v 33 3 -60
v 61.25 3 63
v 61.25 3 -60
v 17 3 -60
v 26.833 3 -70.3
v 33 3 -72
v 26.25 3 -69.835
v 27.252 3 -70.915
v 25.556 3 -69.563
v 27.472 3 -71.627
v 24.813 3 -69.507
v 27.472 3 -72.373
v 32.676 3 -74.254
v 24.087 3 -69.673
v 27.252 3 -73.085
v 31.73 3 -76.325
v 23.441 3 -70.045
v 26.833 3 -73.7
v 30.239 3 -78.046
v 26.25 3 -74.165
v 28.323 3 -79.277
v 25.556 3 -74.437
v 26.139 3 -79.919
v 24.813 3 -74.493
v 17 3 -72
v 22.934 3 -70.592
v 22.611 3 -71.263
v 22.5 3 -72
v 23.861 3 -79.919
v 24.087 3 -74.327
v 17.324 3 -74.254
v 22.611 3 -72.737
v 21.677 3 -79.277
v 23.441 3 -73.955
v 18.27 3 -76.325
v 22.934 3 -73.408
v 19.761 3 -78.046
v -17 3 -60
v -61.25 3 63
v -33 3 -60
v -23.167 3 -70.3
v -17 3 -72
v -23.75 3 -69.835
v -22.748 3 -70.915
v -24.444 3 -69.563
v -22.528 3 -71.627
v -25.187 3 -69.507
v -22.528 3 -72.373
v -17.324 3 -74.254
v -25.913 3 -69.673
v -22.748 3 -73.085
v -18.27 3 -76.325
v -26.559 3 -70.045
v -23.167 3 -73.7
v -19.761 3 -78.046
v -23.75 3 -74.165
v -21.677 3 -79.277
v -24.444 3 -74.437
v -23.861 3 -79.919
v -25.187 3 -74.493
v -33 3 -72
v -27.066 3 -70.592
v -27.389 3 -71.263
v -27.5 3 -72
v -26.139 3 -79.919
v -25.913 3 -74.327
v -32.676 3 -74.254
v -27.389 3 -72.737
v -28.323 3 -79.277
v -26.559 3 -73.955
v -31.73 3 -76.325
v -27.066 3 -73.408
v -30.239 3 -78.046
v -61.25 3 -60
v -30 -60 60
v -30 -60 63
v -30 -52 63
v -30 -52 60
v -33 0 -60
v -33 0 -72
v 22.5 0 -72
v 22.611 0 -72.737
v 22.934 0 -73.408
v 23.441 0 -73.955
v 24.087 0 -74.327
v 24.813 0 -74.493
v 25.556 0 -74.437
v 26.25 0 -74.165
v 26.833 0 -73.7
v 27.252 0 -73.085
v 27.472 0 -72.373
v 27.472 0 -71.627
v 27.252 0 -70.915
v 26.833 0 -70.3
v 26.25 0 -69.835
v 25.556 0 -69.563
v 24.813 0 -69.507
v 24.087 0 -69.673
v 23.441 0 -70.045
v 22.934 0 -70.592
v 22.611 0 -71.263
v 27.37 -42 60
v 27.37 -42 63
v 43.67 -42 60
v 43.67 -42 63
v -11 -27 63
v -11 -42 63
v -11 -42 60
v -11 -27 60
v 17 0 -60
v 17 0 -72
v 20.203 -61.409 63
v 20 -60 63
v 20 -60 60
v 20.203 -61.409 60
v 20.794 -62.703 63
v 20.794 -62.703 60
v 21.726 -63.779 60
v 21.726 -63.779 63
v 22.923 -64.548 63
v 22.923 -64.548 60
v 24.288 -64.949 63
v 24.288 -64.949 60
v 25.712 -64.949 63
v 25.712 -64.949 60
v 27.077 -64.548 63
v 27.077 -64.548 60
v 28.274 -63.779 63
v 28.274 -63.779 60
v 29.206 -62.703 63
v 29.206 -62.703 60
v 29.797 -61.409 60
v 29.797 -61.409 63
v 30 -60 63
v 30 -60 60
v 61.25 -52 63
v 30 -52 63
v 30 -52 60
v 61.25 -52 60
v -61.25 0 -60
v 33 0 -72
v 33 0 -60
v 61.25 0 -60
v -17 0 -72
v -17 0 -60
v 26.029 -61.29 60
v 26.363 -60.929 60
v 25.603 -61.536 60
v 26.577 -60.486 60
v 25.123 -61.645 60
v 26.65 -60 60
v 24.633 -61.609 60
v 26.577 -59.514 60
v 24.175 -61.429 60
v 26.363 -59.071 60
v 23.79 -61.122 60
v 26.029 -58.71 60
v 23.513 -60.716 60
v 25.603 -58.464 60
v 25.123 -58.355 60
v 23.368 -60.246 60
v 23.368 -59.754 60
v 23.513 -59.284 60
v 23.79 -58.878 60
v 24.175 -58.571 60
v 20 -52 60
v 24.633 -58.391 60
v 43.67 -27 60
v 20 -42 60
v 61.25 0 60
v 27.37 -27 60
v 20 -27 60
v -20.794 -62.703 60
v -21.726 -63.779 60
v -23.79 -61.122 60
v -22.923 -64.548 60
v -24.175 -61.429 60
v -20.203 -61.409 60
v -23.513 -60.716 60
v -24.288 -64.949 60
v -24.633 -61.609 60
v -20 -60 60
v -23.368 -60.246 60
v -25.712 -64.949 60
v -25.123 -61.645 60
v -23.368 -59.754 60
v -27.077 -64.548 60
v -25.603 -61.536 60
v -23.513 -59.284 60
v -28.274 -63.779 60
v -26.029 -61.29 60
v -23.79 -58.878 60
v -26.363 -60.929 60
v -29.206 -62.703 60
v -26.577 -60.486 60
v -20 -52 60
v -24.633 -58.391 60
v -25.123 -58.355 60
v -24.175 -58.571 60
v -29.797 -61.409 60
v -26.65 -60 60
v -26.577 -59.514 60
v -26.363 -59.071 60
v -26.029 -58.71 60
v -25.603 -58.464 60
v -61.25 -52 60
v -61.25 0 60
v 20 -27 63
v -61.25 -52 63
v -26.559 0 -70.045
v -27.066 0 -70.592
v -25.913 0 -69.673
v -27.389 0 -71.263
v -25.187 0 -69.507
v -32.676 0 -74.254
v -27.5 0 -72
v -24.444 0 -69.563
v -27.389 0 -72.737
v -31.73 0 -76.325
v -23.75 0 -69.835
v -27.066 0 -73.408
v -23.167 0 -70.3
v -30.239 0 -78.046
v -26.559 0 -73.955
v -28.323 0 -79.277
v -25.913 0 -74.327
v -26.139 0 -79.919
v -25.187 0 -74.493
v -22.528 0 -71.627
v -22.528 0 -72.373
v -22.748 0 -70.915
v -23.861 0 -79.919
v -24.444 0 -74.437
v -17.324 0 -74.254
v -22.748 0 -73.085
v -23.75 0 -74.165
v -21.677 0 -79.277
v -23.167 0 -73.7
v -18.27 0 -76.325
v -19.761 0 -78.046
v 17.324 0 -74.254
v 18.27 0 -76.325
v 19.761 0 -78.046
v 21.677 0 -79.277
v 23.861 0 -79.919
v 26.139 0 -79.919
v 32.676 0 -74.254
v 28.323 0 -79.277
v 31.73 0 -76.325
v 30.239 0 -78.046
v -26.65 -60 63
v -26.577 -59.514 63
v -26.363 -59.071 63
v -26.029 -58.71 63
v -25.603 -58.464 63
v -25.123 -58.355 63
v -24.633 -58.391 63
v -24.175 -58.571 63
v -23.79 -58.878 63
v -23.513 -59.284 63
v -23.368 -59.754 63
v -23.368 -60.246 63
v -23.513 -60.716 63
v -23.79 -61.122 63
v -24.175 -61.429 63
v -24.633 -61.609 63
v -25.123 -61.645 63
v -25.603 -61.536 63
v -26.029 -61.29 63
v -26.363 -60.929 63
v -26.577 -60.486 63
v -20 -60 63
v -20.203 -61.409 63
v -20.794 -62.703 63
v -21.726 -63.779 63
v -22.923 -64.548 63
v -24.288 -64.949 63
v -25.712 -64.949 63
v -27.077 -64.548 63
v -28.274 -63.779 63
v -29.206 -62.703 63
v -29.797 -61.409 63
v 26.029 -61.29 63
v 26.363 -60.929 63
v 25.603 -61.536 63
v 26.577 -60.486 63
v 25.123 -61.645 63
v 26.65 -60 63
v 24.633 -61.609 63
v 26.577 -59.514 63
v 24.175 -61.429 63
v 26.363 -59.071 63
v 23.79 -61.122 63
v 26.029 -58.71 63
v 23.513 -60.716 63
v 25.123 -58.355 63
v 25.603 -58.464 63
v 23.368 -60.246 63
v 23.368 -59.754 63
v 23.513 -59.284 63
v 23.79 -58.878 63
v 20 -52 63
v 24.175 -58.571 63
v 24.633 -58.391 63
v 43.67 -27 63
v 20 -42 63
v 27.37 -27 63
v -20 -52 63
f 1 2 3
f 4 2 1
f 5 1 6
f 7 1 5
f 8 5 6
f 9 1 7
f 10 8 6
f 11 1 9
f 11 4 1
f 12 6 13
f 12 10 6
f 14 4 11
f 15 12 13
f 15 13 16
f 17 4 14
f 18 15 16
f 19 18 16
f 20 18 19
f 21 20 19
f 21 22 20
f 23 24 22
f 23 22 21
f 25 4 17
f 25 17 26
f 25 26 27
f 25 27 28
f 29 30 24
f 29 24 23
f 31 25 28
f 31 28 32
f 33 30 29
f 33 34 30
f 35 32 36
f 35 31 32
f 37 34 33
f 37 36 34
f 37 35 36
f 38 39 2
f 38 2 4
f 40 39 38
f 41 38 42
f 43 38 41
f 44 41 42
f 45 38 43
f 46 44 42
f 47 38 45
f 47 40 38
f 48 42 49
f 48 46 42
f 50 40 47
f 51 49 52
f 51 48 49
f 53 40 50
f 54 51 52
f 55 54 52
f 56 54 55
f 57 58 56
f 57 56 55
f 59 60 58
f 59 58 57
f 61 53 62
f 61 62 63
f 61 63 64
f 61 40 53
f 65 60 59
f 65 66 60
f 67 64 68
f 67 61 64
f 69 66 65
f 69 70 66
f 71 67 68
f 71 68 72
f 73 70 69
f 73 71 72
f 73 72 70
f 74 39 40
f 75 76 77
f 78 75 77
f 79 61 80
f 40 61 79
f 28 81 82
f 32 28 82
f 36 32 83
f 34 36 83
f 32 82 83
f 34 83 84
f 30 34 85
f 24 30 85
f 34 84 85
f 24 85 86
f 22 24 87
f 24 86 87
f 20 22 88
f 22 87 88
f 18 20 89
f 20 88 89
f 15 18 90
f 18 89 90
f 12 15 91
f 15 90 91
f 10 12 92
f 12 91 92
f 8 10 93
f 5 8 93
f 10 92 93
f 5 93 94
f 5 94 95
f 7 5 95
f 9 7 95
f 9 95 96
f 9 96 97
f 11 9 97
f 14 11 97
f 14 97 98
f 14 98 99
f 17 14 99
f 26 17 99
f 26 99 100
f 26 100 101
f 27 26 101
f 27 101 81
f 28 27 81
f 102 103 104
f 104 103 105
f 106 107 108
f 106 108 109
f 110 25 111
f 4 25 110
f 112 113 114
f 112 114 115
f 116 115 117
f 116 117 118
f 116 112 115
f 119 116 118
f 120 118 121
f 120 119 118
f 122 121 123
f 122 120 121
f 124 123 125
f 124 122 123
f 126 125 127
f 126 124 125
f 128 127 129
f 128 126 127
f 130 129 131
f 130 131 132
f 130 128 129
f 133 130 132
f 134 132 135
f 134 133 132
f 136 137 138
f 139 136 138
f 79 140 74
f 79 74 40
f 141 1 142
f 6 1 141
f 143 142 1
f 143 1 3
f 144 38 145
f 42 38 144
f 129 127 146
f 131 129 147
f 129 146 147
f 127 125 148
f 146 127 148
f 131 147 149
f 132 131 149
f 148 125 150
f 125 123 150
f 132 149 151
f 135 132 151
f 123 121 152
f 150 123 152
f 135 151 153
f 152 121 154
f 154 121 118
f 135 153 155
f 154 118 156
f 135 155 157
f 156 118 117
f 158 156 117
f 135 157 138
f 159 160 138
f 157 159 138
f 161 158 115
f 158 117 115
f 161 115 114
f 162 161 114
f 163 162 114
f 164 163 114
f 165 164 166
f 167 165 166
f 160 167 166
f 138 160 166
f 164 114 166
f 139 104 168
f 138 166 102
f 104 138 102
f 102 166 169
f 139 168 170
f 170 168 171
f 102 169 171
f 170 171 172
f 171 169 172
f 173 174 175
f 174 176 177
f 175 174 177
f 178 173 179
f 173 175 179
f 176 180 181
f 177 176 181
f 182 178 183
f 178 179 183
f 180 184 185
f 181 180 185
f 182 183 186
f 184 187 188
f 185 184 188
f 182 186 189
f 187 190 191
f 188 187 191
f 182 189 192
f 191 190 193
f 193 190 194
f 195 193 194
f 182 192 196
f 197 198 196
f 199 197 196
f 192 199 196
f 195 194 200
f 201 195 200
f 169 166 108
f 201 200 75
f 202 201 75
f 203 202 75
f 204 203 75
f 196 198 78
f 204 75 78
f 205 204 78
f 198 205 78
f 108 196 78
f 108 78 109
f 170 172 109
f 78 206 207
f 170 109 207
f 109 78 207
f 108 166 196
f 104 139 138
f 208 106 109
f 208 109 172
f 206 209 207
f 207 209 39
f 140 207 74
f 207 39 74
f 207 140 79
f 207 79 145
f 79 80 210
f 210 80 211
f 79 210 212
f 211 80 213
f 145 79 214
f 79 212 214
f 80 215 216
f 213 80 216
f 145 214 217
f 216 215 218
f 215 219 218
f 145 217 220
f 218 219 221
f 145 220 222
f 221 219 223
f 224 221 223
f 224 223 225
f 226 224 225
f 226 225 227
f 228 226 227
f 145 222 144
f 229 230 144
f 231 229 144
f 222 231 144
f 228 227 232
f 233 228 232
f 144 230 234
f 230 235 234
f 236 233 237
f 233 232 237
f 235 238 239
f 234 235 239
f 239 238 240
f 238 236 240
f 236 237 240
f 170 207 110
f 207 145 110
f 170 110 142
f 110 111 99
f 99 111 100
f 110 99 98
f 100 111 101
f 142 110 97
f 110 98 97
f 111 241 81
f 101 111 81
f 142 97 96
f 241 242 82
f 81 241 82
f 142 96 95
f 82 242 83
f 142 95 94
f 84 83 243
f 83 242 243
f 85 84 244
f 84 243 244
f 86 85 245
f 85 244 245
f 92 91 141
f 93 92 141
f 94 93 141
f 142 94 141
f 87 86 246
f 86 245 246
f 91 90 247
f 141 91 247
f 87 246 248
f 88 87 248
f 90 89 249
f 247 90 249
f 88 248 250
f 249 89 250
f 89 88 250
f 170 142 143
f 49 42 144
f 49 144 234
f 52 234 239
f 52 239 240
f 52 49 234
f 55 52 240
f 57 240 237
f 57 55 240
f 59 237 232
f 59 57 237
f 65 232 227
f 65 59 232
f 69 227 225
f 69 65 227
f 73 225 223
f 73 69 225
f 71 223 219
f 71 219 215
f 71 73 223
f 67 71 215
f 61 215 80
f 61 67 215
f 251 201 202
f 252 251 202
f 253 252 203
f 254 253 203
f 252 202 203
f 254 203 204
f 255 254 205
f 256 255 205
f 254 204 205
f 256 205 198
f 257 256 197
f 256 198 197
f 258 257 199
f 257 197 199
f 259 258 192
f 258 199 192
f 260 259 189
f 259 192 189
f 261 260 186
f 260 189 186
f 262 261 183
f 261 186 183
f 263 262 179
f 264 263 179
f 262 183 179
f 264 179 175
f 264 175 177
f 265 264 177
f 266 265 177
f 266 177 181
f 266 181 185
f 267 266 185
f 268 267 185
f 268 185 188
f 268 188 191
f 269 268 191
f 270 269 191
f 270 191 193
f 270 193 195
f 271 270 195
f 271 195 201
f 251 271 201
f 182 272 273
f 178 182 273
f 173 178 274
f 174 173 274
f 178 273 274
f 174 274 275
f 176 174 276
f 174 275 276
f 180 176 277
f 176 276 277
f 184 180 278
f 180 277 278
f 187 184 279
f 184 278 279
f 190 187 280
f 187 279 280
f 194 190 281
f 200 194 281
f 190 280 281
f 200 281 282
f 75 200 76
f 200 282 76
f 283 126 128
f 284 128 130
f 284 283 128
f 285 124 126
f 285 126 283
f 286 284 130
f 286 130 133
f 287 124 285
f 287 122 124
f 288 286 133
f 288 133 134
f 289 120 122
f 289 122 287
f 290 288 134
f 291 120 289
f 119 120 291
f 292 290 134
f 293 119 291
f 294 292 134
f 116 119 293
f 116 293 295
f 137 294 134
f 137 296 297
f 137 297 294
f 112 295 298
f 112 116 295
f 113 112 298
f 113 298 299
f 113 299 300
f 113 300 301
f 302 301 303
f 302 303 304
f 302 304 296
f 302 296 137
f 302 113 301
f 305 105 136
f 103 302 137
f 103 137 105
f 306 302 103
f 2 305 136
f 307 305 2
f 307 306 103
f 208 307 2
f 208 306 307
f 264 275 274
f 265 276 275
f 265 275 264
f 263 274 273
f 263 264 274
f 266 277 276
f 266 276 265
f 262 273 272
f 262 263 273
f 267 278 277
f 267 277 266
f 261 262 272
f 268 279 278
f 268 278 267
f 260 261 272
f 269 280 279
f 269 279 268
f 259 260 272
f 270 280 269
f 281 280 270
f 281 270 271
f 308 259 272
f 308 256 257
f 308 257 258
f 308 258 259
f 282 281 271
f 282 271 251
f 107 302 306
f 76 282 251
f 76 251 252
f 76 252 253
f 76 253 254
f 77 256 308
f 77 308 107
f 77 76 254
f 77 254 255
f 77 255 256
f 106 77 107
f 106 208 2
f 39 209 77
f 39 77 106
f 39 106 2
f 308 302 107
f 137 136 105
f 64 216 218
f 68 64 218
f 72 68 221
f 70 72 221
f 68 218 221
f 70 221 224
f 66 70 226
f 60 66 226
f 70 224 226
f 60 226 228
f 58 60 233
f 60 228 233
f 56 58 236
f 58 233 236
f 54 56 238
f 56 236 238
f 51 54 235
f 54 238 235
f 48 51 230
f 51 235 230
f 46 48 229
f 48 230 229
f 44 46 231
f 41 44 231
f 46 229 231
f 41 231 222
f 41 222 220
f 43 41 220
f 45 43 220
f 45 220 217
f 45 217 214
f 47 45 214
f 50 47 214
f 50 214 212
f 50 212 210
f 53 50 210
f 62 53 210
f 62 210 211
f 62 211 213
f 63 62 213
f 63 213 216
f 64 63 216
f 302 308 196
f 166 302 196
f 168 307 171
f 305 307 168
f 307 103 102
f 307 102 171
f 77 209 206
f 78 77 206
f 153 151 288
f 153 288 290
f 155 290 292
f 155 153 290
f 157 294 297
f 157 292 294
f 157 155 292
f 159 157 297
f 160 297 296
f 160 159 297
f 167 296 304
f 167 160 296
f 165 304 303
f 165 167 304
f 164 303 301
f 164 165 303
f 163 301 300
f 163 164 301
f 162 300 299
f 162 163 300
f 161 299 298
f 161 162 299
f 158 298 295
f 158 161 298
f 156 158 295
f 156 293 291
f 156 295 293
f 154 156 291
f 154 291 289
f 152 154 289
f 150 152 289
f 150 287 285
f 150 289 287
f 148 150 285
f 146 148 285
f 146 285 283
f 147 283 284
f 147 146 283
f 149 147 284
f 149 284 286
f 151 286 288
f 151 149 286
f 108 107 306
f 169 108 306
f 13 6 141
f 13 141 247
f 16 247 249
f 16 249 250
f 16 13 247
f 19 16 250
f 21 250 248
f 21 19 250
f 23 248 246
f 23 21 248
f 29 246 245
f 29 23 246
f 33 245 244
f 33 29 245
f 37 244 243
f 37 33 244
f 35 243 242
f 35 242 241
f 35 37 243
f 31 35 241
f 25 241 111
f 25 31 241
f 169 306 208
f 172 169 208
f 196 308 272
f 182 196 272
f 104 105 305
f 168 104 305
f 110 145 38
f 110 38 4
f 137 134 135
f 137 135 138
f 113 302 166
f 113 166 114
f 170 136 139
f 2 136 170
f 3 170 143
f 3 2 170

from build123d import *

# Parameters (mm, degrees)
SKETCH_1_W           = 122.5
SKETCH_1_H           = 120
EXTRUDE_1_DEPTH      = 3
EXTRUDE_2_DEPTH      = 61.25
EXTRUDE_2_DEPTH_BACK = 61.25
SKETCH_5_W           = 3
SKETCH_5_H           = 55
EXTRUDE_3_DEPTH      = 3
HOLE_WIZARD_M6_1_D   = 5
EXTRUDE_4_DEPTH      = 3
HOLE_WIZARD_M4_3_D   = 3.3
SKETCH_29_W          = 31
SKETCH_29_H          = 15
SKETCH_29_W_2        = 16.3
CUT_EXTRUDE_1_DEPTH  = 169.59882117


with BuildPart() as part:
    # 草图1 → 凸台-拉伸1 (new body)
    with BuildSketch(Plane(origin=(0, 0, 0), x_dir=(1, 0, 0), z_dir=(0, 1, 0))):
        Rectangle(SKETCH_1_W, SKETCH_1_H)
    extrude(amount=EXTRUDE_1_DEPTH)

    # 草图5 → 凸台-拉伸2 (add, two sides: drawn at the far end of the back side and taken through both)
    with BuildSketch(Plane(origin=(0, 0, 0), x_dir=(0, 0, -1), z_dir=(1, 0, 0)).offset(-EXTRUDE_2_DEPTH_BACK)):
        with Locations((-61.5, -24.5)):
            Rectangle(SKETCH_5_W, SKETCH_5_H)
    extrude(amount=EXTRUDE_2_DEPTH + EXTRUDE_2_DEPTH_BACK)

    # 草图23 → 凸台-拉伸3 (add)
    with BuildSketch(Plane(origin=(0, 3, 0), x_dir=(1, 0, 0), z_dir=(0, 1, 0))):
        with BuildLine():
            Line((17, 60), (33, 60))
            Line((33, 60), (33, 72))
            ThreePointArc((33, 72), (25, 80), (17, 72))
            Line((17, 72), (17, 60))
        make_face()
        with BuildLine():
            Line((-17, 60), (-17, 72))
            ThreePointArc((-17, 72), (-25, 80), (-33, 72))
            Line((-33, 72), (-33, 60))
            Line((-33, 60), (-17, 60))
        make_face()
    extrude(amount=-EXTRUDE_3_DEPTH)

    # M6 螺纹孔1 (through all)
    with Locations(Plane(origin=(0, 3, 0), x_dir=(1, 0, 0), z_dir=(0, 1, 0))):
        with Locations((-25, 72), (25, 72)):
            Hole(HOLE_WIZARD_M6_1_D / 2)

    # 草图26 → 凸台-拉伸4 (add)
    with BuildSketch(Plane.XY.offset(63)):
        with BuildLine():
            Line((-30, -52), (-20, -52))
            Line((-20, -52), (-20, -60))
            ThreePointArc((-20, -60), (-25, -65), (-30, -60))
            Line((-30, -60), (-30, -52))
        make_face()
        with BuildLine():
            Line((30, -52), (20, -52))
            Line((20, -52), (20, -60))
            ThreePointArc((20, -60), (25, -65), (30, -60))
            Line((30, -60), (30, -52))
        make_face()
    extrude(amount=-EXTRUDE_4_DEPTH)

    # M4 螺纹孔3 (through all)
    with Locations(Plane.XY.offset(63)):
        with Locations((-25, -60)):
            hole_wizard_m4_3 = Hole(HOLE_WIZARD_M4_3_D / 2)

    # 镜向8: M4 螺纹孔3 across plane
    add(hole_wizard_m4_3.mirror(Plane(origin=(0, 0, 0), x_dir=(0, 0, 1), z_dir=(1, 0, 0))), mode=Mode.SUBTRACT)

    # 草图29 → 切除-拉伸1 (cut, through all)
    with BuildSketch(Plane.XY.offset(63)):
        with Locations((4.5, -34.5)):
            Rectangle(SKETCH_29_W, SKETCH_29_H)
        with Locations((35.52, -34.5)):
            Rectangle(SKETCH_29_W_2, SKETCH_29_H)
    extrude(amount=-CUT_EXTRUDE_1_DEPTH, mode=Mode.SUBTRACT)


solid = part.part
